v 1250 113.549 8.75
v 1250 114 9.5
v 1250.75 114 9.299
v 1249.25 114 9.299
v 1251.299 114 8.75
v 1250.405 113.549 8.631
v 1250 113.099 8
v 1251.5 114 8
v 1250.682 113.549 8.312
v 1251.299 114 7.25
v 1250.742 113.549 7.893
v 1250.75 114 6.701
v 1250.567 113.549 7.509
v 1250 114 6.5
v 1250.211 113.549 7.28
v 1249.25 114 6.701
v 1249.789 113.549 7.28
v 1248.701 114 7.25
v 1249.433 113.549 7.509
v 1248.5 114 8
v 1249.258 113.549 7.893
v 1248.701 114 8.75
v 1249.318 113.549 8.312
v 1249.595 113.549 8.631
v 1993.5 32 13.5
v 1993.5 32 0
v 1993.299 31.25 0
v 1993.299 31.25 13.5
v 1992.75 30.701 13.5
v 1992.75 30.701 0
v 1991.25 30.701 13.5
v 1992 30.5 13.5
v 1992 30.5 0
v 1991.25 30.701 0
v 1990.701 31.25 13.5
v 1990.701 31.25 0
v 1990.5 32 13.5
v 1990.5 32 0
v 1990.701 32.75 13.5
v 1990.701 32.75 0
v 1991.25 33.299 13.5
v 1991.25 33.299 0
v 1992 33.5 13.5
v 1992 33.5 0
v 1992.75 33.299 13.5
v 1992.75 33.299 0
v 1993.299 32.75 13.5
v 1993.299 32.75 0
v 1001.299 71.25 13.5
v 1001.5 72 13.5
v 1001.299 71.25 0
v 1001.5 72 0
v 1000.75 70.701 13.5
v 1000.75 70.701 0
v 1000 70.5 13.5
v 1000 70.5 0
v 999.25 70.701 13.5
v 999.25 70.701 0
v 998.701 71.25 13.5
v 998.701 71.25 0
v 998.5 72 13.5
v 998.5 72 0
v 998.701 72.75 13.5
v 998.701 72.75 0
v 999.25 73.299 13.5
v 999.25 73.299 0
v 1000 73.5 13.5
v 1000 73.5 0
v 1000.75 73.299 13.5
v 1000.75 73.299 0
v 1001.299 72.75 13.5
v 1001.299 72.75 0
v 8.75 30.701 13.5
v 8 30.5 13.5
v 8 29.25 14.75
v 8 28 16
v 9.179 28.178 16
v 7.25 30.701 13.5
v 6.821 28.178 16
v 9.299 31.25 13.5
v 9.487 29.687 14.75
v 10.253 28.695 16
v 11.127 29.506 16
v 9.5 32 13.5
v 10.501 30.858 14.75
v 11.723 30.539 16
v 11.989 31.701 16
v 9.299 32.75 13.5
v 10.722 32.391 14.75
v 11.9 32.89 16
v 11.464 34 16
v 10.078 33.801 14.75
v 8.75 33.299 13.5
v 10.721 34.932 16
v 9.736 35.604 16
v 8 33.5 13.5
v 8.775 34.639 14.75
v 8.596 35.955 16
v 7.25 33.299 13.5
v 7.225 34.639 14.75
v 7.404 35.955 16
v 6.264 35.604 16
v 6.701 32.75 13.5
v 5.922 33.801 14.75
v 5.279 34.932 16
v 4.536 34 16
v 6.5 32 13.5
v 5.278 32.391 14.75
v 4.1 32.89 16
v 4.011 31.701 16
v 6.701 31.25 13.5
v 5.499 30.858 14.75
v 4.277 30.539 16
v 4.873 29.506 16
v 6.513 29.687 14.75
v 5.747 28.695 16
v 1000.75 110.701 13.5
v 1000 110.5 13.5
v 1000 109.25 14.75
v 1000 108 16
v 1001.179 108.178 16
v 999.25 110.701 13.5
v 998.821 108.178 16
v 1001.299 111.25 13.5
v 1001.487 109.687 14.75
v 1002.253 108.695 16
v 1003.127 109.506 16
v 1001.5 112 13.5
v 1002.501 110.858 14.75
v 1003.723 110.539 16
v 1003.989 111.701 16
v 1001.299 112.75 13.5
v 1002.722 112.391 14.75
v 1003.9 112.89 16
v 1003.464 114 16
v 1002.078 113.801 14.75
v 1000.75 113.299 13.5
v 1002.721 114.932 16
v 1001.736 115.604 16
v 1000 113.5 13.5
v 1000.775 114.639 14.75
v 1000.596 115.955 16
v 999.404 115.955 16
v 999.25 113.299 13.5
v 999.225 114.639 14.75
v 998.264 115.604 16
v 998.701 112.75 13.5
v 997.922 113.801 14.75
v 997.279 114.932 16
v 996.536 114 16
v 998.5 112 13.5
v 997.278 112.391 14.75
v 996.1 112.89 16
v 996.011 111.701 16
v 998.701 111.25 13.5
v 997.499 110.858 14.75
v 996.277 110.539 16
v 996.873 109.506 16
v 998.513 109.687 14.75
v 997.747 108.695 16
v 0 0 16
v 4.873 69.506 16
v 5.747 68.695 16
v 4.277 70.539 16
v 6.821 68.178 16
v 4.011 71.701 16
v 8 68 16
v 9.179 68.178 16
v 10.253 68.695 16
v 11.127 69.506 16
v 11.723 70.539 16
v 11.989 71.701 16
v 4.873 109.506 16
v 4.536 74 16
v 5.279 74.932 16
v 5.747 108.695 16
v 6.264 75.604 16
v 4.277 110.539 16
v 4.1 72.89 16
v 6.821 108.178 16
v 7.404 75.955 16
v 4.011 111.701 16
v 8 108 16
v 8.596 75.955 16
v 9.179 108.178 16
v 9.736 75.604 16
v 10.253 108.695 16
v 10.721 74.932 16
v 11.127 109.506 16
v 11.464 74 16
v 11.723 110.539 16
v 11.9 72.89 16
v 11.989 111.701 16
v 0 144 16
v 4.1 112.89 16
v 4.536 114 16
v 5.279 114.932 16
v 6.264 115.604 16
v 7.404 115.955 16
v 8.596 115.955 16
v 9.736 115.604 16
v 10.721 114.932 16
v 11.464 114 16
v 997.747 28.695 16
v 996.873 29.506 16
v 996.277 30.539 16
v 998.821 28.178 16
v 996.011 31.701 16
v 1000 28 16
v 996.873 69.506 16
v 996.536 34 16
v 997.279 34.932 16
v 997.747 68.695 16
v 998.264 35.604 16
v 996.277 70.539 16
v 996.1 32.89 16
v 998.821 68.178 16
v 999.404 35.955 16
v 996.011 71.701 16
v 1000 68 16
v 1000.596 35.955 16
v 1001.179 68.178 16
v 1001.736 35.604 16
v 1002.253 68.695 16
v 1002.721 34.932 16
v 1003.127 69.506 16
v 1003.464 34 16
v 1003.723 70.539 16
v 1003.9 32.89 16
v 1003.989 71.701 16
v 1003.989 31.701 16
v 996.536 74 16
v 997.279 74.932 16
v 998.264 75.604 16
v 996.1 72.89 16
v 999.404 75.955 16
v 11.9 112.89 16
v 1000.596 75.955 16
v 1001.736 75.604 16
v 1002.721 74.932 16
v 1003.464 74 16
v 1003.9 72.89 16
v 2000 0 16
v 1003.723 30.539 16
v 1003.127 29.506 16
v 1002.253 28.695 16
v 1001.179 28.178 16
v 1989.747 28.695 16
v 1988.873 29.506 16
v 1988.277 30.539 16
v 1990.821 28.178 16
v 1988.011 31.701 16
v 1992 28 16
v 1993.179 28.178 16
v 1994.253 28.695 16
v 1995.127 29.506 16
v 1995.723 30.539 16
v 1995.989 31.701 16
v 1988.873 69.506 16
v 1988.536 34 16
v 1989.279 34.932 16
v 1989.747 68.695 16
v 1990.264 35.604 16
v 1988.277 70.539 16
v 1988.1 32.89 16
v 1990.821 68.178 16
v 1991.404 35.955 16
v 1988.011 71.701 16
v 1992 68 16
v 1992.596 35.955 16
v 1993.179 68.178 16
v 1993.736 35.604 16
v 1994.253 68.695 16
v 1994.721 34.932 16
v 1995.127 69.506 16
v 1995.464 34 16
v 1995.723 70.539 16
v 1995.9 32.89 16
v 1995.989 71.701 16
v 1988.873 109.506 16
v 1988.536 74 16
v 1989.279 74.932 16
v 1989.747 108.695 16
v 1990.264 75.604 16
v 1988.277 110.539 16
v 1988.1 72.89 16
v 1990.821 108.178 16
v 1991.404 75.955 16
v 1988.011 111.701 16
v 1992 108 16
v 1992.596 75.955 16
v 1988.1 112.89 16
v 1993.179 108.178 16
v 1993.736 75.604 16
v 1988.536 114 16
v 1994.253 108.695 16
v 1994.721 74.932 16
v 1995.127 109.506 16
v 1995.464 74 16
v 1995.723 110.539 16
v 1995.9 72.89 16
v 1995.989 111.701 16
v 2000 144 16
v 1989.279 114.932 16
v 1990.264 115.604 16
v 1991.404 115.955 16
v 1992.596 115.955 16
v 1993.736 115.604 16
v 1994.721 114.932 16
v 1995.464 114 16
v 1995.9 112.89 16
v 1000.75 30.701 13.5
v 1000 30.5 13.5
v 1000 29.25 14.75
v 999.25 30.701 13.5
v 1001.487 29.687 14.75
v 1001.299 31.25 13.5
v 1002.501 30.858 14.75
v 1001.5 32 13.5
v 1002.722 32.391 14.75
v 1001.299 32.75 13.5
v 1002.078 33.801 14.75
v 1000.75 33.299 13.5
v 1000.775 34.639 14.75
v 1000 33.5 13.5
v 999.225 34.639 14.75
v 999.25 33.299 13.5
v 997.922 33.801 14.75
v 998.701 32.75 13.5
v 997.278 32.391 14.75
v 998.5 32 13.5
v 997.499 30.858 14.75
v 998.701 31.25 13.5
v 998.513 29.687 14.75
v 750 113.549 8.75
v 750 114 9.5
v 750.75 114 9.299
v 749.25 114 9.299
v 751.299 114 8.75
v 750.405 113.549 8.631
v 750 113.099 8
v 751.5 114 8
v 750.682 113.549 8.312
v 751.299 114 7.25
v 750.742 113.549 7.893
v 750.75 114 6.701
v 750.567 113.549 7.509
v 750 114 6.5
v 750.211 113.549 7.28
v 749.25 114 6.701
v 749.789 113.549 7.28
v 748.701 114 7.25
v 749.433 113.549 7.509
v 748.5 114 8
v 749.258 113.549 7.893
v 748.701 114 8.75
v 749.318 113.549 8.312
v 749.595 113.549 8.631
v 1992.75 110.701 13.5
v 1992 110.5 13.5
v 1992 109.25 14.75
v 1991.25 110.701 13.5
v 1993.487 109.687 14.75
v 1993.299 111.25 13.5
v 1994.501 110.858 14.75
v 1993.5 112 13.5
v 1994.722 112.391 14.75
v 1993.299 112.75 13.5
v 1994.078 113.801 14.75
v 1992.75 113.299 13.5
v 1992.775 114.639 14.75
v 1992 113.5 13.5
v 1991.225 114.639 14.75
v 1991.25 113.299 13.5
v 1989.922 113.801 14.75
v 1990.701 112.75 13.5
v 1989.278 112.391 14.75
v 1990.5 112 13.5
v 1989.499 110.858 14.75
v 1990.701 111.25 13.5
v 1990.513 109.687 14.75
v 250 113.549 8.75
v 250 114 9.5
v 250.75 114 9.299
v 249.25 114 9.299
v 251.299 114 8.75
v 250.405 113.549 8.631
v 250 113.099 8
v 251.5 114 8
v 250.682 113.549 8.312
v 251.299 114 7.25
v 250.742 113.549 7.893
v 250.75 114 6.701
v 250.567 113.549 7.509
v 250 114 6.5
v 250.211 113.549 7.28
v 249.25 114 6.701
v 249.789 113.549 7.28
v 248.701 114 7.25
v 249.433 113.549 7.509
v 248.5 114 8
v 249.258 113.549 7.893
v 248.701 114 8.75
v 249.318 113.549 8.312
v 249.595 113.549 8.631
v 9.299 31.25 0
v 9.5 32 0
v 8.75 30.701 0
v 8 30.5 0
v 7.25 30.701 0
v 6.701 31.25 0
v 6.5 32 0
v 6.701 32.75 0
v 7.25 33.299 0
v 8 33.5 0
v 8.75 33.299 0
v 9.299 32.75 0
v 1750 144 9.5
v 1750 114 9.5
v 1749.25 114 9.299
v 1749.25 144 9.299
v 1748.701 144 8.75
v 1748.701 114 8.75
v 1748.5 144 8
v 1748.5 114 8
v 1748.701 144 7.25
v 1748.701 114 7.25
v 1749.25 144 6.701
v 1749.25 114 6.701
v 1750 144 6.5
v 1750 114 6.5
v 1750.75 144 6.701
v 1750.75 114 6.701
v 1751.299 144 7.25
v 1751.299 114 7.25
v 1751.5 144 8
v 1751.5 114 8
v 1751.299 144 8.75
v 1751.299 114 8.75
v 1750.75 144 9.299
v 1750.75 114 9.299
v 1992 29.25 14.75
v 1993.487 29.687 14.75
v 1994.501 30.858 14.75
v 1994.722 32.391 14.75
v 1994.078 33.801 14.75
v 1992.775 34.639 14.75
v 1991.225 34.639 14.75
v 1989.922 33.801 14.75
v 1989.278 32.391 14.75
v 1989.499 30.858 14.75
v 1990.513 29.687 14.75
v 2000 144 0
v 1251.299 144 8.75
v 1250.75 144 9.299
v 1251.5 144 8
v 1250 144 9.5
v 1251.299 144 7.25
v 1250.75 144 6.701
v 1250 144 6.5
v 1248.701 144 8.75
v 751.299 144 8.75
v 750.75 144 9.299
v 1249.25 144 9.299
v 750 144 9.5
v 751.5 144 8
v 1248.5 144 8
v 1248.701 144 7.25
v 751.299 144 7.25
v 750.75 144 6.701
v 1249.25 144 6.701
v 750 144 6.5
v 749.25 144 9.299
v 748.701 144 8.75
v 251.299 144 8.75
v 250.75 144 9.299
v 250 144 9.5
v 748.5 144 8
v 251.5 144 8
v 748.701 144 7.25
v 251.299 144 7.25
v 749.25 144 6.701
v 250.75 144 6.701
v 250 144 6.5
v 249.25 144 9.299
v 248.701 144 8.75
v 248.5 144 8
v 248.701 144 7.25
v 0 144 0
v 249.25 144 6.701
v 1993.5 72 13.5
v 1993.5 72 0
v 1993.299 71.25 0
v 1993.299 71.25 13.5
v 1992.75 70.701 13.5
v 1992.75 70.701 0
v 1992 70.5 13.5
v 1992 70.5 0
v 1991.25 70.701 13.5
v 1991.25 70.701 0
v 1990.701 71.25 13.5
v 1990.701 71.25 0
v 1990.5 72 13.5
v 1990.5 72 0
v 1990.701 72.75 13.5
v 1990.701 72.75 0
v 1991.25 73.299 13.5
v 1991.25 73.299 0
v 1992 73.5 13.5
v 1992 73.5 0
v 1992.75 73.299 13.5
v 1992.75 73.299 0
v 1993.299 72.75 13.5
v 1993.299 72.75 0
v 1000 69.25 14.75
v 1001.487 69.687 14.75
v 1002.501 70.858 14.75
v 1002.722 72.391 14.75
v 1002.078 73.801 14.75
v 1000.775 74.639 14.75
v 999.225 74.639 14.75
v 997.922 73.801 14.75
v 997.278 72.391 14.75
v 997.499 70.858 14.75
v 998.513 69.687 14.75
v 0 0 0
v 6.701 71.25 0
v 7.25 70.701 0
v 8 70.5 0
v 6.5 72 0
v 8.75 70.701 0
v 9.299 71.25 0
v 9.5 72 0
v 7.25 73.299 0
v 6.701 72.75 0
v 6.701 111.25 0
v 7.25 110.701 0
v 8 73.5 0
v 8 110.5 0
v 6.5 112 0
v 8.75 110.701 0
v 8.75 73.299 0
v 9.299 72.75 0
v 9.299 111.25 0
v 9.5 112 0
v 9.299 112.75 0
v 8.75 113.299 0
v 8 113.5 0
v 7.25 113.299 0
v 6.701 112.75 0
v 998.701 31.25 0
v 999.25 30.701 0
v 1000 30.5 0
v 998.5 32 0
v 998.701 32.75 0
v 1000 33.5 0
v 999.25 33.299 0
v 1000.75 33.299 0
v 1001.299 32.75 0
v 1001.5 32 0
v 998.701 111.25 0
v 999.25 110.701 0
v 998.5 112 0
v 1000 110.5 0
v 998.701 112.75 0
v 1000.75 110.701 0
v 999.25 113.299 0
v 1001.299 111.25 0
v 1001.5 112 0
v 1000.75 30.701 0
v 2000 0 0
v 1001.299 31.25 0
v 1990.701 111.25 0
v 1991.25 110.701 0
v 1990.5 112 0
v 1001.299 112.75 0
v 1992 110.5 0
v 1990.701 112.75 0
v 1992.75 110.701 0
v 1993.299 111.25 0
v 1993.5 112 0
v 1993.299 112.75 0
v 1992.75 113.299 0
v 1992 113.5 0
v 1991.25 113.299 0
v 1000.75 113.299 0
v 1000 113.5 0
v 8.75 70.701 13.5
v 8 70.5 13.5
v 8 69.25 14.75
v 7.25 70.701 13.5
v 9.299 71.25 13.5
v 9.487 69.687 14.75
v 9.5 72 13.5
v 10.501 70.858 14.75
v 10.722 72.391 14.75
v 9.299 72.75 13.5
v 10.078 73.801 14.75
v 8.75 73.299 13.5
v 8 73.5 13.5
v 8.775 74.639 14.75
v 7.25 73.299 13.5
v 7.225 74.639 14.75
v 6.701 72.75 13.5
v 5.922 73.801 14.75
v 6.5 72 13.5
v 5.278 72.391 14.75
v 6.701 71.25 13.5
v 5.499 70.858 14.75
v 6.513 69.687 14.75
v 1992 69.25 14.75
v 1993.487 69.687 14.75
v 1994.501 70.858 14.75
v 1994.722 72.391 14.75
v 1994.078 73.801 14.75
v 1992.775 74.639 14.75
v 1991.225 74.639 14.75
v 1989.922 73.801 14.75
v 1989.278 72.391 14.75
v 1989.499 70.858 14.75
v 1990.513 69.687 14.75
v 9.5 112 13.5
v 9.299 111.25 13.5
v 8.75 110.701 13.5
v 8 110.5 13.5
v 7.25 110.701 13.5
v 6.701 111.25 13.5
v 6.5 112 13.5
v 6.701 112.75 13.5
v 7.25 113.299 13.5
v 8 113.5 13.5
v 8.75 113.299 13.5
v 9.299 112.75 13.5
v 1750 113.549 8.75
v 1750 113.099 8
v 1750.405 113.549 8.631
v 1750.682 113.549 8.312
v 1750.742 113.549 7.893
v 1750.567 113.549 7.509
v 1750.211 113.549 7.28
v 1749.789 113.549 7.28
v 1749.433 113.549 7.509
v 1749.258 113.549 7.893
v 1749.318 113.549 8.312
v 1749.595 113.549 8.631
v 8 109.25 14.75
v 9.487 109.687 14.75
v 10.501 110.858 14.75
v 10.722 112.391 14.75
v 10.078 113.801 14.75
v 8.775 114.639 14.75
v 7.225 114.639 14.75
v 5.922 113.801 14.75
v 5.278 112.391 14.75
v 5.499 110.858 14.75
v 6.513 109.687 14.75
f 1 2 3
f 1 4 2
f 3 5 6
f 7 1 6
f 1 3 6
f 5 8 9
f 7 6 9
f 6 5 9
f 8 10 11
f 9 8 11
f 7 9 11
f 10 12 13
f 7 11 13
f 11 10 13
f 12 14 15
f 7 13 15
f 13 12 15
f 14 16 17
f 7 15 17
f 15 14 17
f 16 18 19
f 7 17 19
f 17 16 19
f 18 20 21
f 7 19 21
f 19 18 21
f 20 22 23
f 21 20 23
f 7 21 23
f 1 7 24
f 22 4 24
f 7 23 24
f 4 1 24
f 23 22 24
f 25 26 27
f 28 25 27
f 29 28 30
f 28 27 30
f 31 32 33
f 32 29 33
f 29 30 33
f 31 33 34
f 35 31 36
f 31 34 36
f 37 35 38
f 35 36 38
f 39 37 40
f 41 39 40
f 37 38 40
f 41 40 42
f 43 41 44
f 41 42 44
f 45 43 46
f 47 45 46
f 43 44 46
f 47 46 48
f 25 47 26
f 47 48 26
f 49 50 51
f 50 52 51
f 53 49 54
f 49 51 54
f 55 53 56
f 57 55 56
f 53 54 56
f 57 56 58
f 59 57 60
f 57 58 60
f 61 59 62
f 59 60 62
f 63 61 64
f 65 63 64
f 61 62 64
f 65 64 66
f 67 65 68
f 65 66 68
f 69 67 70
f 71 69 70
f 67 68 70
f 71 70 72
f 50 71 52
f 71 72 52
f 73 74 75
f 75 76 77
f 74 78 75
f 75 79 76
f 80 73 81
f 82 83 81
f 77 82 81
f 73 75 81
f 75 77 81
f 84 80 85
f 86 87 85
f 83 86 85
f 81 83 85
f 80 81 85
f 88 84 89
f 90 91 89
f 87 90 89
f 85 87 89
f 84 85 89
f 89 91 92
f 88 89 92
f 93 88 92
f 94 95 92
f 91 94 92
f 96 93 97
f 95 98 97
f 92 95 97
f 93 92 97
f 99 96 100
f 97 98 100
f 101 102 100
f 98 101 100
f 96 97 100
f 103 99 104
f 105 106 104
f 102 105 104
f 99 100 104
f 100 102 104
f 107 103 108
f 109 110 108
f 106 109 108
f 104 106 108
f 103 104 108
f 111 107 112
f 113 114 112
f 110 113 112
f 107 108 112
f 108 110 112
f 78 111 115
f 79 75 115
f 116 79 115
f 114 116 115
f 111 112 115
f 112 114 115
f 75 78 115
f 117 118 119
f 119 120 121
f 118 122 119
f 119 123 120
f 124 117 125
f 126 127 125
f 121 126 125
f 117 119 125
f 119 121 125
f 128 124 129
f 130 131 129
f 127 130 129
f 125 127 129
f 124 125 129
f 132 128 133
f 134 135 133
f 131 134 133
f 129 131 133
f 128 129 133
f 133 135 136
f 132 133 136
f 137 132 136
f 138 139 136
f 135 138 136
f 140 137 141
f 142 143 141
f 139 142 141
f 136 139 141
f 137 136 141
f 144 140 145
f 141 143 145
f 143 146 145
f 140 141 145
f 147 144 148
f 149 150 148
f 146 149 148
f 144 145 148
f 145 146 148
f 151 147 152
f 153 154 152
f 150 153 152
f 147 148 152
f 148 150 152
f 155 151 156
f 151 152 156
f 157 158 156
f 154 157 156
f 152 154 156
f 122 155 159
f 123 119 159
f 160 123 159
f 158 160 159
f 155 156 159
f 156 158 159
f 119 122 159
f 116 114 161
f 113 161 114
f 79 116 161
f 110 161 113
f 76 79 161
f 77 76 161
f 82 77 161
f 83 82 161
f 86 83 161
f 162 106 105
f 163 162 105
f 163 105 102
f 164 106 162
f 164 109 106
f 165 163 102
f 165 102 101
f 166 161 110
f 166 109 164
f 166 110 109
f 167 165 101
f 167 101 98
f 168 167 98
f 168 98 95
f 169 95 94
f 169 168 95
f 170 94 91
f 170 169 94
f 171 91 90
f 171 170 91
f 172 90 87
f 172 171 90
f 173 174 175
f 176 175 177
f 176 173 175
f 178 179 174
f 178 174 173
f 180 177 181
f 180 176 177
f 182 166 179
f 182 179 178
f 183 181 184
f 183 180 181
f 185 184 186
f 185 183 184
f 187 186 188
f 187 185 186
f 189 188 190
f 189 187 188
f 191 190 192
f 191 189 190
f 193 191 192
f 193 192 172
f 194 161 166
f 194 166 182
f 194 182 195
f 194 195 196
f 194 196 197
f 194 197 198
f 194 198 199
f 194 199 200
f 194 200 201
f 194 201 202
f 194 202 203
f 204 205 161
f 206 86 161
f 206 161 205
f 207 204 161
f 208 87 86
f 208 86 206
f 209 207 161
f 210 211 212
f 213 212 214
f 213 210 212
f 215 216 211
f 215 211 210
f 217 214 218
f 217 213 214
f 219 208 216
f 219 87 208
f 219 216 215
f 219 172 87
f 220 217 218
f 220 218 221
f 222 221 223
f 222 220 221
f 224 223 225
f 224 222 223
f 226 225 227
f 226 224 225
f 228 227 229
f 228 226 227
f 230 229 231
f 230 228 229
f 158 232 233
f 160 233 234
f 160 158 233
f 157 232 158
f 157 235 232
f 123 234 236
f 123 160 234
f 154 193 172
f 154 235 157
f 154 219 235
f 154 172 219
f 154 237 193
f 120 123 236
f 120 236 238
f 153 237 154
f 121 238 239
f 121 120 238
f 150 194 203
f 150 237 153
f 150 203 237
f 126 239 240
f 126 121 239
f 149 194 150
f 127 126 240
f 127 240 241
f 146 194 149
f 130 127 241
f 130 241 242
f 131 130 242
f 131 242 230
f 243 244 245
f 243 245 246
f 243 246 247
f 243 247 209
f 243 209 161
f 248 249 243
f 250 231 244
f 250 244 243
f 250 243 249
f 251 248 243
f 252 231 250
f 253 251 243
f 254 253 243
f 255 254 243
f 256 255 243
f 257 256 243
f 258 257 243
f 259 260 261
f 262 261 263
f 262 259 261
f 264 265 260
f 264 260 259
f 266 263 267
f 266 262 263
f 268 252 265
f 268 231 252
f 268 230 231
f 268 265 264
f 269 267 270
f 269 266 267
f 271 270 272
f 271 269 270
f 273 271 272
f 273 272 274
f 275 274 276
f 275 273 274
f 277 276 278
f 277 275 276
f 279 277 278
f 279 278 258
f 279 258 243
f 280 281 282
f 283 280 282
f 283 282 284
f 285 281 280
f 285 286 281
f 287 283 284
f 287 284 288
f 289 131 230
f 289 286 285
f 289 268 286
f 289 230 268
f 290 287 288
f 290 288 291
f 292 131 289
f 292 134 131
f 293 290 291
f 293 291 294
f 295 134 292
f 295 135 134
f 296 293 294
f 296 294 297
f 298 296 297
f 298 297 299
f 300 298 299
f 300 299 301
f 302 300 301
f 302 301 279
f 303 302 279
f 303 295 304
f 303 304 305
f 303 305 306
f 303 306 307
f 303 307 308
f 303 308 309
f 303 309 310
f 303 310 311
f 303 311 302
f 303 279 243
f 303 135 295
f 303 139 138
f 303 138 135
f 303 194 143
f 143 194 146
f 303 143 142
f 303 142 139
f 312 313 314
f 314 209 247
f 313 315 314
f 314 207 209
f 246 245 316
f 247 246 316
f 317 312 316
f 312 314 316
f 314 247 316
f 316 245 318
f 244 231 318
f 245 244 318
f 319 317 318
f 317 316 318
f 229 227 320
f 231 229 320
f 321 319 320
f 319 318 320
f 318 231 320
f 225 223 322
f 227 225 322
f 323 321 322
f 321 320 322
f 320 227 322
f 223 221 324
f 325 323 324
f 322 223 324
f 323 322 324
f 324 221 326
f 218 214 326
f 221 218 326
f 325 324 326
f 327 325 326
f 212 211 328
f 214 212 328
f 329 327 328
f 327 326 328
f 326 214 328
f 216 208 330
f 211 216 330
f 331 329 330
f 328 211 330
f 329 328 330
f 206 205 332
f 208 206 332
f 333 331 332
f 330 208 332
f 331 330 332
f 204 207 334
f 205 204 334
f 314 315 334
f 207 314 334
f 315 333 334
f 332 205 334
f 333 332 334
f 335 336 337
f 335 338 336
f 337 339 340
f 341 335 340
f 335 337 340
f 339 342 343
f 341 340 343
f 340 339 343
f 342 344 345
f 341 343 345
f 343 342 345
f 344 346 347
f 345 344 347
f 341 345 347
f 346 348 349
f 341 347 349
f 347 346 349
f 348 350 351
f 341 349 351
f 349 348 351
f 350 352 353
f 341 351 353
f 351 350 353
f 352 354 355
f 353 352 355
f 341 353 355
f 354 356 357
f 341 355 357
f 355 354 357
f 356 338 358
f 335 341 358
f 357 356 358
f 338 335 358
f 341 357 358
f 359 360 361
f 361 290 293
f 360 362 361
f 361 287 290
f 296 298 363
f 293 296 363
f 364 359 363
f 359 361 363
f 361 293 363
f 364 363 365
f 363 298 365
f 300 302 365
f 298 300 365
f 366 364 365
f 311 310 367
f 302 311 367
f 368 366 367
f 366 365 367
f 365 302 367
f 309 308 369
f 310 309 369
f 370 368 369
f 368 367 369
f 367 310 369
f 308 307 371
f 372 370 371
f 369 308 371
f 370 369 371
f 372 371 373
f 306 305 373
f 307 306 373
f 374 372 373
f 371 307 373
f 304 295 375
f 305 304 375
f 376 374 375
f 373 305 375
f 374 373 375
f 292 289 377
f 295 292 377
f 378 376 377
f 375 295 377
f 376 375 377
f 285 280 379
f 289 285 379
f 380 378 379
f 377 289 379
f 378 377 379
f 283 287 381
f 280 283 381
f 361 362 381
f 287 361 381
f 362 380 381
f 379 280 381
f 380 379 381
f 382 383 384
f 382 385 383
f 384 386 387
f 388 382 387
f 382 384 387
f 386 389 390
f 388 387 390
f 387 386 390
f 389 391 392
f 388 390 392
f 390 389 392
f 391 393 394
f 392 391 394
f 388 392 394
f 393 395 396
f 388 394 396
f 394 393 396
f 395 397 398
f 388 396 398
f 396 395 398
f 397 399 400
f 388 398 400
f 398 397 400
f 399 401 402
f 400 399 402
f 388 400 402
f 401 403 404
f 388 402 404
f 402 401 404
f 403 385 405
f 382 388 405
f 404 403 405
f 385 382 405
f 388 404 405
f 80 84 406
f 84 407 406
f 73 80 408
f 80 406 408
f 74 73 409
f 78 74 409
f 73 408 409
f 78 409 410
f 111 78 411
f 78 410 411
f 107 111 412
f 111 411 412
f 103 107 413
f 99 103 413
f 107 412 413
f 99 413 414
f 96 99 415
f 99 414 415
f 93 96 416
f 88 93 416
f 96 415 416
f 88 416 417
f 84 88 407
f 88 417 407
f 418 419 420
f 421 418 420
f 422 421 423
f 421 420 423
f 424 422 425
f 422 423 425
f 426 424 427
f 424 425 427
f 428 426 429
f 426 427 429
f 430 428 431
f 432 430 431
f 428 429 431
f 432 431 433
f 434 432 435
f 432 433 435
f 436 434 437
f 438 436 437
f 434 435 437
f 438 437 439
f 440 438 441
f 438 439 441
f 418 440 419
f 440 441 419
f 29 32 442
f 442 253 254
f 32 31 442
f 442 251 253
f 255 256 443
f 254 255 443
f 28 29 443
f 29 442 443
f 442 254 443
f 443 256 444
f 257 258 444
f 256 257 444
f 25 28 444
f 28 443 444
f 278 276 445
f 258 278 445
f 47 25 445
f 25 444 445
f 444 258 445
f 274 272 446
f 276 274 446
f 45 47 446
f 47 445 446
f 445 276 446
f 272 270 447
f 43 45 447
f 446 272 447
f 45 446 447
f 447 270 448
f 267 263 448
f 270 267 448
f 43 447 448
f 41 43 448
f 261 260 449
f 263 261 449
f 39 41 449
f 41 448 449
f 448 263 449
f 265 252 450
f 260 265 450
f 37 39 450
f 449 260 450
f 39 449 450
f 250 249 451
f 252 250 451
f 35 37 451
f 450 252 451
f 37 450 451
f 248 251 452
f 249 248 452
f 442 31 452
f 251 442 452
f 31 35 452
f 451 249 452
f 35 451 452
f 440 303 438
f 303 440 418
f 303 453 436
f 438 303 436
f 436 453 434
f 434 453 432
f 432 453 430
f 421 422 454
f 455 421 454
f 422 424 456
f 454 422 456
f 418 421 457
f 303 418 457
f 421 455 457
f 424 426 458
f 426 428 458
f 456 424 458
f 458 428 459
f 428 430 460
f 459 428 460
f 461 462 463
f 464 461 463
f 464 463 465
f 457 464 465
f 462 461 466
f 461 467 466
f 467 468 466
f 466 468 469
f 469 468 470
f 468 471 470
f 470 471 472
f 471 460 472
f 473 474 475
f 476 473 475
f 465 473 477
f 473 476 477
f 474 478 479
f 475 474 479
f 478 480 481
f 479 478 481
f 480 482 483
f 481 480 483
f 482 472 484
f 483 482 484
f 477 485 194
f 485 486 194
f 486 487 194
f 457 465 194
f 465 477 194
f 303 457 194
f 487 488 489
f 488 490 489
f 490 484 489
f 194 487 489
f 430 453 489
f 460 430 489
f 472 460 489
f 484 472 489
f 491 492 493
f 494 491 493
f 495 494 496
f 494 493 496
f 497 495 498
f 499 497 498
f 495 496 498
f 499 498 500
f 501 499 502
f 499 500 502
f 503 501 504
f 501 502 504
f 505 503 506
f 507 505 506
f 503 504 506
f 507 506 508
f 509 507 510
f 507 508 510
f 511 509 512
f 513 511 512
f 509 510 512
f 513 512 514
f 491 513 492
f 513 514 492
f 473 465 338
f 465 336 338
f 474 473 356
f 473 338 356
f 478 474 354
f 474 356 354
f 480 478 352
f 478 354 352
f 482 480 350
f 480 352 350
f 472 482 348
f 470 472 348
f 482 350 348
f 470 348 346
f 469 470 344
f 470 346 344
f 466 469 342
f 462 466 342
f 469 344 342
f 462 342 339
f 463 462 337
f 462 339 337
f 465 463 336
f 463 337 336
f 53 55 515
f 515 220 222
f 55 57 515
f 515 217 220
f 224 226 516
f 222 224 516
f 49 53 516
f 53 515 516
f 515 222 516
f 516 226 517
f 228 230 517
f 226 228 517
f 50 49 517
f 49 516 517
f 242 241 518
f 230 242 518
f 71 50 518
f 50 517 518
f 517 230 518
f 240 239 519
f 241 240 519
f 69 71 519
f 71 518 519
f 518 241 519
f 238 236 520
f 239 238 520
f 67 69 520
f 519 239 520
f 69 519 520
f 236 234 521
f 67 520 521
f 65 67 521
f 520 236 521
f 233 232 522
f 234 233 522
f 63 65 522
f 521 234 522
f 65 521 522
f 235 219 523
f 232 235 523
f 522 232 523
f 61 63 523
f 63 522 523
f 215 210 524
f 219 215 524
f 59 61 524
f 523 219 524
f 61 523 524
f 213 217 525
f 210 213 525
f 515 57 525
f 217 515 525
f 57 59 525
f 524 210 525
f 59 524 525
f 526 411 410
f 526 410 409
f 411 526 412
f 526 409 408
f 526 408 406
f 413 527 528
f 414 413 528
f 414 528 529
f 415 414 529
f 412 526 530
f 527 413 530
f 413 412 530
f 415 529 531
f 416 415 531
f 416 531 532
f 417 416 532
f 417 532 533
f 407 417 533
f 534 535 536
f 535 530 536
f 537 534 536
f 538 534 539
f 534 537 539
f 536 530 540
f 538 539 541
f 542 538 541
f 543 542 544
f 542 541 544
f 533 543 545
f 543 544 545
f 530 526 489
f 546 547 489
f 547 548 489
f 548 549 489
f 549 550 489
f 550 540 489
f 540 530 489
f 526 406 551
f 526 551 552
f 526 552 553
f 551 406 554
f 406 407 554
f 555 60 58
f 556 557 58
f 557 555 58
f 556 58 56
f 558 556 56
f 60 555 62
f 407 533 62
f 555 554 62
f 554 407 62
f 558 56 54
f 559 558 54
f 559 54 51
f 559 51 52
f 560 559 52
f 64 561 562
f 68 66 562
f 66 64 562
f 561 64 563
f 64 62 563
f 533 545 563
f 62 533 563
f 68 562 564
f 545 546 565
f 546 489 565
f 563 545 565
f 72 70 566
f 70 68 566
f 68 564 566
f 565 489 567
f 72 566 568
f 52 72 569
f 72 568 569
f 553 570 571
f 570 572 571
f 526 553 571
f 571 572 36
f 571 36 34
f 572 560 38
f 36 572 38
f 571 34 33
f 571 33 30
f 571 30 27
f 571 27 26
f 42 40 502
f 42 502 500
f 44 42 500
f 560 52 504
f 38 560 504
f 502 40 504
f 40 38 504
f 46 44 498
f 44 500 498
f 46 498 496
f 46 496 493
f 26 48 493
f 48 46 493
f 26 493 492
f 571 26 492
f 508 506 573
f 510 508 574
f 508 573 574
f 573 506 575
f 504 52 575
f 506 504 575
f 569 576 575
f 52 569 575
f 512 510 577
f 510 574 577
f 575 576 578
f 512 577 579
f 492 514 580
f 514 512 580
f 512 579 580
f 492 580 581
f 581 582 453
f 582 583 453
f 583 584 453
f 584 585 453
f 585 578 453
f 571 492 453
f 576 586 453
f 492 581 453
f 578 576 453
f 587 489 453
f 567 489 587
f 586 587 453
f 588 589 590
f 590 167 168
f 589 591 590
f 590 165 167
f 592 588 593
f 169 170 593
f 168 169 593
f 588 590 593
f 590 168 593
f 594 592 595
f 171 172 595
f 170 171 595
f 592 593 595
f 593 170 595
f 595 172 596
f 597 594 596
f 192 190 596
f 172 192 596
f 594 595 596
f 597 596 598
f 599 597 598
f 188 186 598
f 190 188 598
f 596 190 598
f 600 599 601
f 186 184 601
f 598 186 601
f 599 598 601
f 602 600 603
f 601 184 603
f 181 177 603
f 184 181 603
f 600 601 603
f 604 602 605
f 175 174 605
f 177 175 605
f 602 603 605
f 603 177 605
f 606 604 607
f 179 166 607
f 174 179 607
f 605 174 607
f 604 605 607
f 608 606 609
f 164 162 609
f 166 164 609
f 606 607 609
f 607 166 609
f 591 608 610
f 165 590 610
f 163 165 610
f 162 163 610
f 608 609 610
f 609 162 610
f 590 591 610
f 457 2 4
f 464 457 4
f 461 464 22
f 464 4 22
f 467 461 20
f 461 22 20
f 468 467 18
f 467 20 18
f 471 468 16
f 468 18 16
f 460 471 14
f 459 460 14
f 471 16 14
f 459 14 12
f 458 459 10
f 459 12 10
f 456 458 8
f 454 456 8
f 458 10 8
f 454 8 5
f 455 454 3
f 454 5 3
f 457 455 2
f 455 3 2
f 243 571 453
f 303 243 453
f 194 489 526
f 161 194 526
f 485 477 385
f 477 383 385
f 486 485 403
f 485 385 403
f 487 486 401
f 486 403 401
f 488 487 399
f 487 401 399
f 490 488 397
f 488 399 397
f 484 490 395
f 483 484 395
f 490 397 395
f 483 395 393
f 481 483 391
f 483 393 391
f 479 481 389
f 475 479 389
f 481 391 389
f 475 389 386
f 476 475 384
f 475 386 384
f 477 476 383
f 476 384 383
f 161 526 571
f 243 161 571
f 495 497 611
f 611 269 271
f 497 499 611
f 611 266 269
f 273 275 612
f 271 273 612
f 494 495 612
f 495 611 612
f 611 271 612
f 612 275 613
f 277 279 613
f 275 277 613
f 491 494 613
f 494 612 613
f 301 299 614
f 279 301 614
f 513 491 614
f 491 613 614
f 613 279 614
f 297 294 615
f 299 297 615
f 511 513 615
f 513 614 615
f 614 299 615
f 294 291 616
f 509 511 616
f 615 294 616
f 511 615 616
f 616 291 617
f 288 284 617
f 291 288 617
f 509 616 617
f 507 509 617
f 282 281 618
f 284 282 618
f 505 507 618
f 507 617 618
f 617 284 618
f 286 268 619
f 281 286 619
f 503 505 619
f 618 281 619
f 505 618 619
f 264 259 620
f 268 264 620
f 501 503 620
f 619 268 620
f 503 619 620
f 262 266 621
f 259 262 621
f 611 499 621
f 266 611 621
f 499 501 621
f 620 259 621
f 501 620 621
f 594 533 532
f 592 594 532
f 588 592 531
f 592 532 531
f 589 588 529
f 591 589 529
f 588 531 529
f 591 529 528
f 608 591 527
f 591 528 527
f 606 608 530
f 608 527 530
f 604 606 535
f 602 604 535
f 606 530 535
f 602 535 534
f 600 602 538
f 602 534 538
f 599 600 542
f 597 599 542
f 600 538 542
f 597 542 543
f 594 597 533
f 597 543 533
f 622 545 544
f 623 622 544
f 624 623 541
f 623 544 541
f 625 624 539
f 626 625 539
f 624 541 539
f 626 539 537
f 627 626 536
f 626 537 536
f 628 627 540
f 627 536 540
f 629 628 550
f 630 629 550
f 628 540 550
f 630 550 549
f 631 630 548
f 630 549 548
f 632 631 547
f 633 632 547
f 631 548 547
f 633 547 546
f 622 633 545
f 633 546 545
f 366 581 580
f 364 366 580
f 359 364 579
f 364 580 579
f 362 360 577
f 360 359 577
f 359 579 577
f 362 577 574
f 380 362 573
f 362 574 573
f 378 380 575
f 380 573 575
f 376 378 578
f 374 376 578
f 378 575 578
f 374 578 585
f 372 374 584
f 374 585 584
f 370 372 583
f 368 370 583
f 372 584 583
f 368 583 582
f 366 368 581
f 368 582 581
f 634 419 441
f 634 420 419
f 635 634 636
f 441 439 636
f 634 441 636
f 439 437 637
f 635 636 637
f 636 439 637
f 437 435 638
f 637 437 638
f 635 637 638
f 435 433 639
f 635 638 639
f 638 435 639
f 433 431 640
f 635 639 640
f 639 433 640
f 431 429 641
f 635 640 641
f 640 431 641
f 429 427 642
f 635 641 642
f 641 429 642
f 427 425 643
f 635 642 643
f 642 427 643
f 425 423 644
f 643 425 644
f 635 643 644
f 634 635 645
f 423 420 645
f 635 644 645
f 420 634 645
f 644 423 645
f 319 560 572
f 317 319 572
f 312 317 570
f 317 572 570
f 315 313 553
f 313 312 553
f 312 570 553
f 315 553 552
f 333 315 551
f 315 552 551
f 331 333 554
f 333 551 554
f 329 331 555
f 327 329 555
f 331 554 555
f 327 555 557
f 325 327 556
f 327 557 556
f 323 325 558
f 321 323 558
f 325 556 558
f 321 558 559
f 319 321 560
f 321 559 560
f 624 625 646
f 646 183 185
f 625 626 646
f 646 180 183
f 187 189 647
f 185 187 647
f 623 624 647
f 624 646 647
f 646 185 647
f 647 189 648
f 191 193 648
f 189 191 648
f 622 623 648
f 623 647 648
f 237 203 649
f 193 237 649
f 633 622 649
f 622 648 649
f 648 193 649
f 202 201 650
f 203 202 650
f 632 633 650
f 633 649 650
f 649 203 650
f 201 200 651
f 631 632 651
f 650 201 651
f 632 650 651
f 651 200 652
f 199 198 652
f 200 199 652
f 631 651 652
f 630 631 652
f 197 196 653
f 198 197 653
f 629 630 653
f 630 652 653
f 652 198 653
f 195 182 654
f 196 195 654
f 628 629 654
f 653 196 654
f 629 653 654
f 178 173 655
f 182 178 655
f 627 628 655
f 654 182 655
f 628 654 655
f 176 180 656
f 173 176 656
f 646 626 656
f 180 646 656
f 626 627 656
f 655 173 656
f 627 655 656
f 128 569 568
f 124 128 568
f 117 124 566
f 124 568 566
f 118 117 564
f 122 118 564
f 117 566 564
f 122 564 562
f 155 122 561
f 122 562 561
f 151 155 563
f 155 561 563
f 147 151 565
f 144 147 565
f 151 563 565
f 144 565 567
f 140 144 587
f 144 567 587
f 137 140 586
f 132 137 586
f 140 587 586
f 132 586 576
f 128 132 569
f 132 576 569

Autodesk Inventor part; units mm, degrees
ref_plane "YZ Plane" through (0, 0, 0) normal (1, 0, 0) x (0, 1, 0)
ref_plane "XZ Plane" through (0, 0, 0) normal (0, 1, 0) x (-1, 0, 0)
ref_plane "XY Plane" through (0, 0, 0) normal (0, 0, 1) x (1, 0, 0)
sketch "Skizze1" plane through (0, 0, 0) normal (0, 0, 1) x (1, 0, 0)
  line L0 (0, 0) -> (2000, 0)
  line L1 (2000, 0) -> (2000, 144)
  line L2 (2000, 144) -> (0, 144)
  line L3 (0, 144) -> (0, 0)
  line L4 (1000, 0) -> (1000, 144) construction
  line L5 (1992, 144) -> (1992, 0) construction
  line L6 (2000, 112) -> (0, 112) construction
  line L7 (2000, 32) -> (0, 32) construction
  circle A0 centre (1992, 112) radius 1.5
  circle A1 centre (1992, 32) radius 1.5
  line L8 (8, 144) -> (8, 0) construction
  circle A2 centre (8, 112) radius 1.5
  circle A3 centre (8, 72) radius 1.5
  circle A4 centre (8, 32) radius 1.5
  circle A5 centre (1992, 72) radius 1.5
  circle A6 centre (1000, 72) radius 1.5
  circle A7 centre (1000, 112) radius 1.5
  circle A8 centre (1000, 32) radius 1.5
  point P0 (2000, 72)
  dimension "d0" = 2000
  dimension "d1" = 144
  dimension "d20" = 8
  dimension "d21" = 40
  dimension "d22" = 40
  dimension "d23" = 3
  dimension "d24" = 3
  dimension "d25" = 8
  dimension "d26" = 3
  dimension "d27" = 3
  dimension "d28" = 3
  dimension "d29" = 3
  dimension "d30" = 3
  dimension "d31" = 3
  dimension "d32" = 3
extrude "Extrusion1" add sketch "Skizze1" along normal blind 16
sketch "Skizze2" plane through (0, 0, 16) normal (0, 0, 1) x (1, 0, 0)
  circle A0 centre (1000, 72) radius 1.5 projected
  circle A1 centre (1992, 112) radius 1.5 projected
  circle A2 centre (1992, 72) radius 1.5 projected
  circle A3 centre (1992, 32) radius 1.5 projected
  circle A4 centre (8, 72) radius 1.5 projected
  circle A5 centre (8, 112) radius 1.5 projected
  circle A6 centre (8, 32) radius 1.5 projected
  circle A7 centre (1000, 32) radius 1.5 projected
  circle A8 centre (1000, 112) radius 1.5 projected
  point P0 (0, 0)
hole "Bohrung7" at (1000, 72, 16) at (1992, 112, 16) at (1992, 72, 16) at (1992, 32, 16) at (8, 72, 16) at (8, 32, 16) at (8, 112, 16) at (1000, 112, 16) at (1000, 32, 16) direction (0, 0, -1) diameter 3 depth 8 countersink diameter 8 countersink angle 90
sketch "Skizze3" plane through (0, 144, 0) normal (0, 1, 0) x (1, 0, 0)
  line L0 (0, 0) -> (2000, 0) construction
  line L1 (2000, 0) -> (2000, -16) construction
  line L2 (2000, -16) -> (0, -16) construction
  line L3 (0, -16) -> (0, 0) construction
  line L4 (0, 0) -> (0, -16) projected
  line L5 (0, -8) -> (2000, -8) construction
  line L6 (2000, 0) -> (2000, -16) projected
  line L7 (0, -16) -> (2000, -16) construction
  line L8 (1000, -16) -> (1000, 0) construction
  point P0 (750, -8)
  point P1 (250, -8)
  point P2 (1250, -8)
  point P3 (1750, -8)
  dimension "d120" = 250
  dimension "d121" = 250
  dimension "d122" = 250
  dimension "d123" = 250
hole "Bohrung12" at (750, 144, 8) at (250, 144, 8) at (1250, 144, 8) at (1750, 144, 8) direction (0, -1, 0) diameter 3 depth 30 tip angle 118
properties part number "licht_200_back1"
